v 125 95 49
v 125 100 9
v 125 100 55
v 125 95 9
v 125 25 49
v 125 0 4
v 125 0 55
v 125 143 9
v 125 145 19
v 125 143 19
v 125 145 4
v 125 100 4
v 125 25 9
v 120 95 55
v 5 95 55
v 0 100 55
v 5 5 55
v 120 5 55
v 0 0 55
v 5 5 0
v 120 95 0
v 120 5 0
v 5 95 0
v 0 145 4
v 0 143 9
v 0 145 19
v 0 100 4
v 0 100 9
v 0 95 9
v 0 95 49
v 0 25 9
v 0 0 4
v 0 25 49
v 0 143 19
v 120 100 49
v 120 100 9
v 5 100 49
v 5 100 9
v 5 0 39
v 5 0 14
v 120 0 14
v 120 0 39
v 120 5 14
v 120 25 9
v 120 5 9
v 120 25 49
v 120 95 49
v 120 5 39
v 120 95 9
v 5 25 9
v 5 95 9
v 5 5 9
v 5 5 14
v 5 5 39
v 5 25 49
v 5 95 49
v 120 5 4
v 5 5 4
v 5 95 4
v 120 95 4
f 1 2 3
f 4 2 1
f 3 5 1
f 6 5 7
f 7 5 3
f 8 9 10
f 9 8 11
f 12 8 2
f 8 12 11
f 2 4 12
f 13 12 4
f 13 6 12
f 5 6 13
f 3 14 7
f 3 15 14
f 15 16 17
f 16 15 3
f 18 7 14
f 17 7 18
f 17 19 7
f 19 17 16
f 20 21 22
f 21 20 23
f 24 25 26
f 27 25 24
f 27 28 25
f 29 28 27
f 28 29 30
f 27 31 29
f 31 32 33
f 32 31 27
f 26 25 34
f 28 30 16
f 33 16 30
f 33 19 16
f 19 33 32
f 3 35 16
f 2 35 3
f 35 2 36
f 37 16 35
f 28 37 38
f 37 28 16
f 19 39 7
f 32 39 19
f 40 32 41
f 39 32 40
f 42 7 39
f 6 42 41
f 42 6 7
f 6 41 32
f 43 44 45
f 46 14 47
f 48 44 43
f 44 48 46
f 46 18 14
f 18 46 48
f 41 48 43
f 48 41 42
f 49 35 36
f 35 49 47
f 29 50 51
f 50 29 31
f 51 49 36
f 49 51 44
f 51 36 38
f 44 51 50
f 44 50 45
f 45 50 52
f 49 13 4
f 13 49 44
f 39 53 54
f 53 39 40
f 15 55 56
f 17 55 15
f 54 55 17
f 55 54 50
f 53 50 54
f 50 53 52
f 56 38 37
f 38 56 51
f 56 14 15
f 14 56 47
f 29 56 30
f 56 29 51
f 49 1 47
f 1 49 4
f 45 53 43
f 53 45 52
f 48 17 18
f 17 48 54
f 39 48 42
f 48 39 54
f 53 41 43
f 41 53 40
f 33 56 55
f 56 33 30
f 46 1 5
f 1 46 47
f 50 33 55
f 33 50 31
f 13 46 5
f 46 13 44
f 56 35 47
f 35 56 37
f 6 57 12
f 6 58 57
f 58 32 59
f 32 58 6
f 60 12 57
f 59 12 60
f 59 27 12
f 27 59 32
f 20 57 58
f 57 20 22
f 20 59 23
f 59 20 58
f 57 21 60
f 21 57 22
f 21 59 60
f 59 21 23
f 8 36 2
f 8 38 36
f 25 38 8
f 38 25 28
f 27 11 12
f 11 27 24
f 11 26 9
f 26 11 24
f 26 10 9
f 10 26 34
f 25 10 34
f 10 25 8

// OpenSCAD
// file: hEX-hAP-Vars.scad
InnerW=115;
InnerD=90;
LipH=4;
Wall=5;
TabX=20;

DW=Wall*2;
TW=Wall*3;
OuterW=InnerW+DW;
OuterD=InnerD+DW;
Buff=1;
DB=Buff*2;
BackStopWall=2;
// main file
include <hEX-hAP-Vars.scad>;

InnerH=31;

BoxFloor=LipH+Wall;
OuterH=LipH+InnerH+DW+DW;
Front=25;
DevFeet=5;
ExtraBack=43;
BackStopWall=2;

difference()
{
  cube([OuterW,OuterD,OuterH]);
  //Main inner Cut
  translate([Wall,Wall,BoxFloor]) cube([InnerW,InnerD,OuterH+DW]); 
  //Front cut
  translate([Wall,-Buff,BoxFloor+DevFeet]) cube([InnerW,DW,Front]);
  //Side Cut
  translate([-Buff,Wall+20,BoxFloor]) cube([OuterW+DB,InnerD-20,OuterH-TW]);
  //Back Cut
  translate([Wall,Wall,BoxFloor]) cube([InnerW,OuterD,OuterH-TW]);
   //Stacking lip
  translate([-Buff,-Buff,-Buff]) cube([OuterW+DB+Buff,Wall+Buff,LipH+Buff]);
  translate([-Buff,-Buff,-Buff]) cube([Wall+Buff,OuterD+DB,LipH+Buff]);
  translate([OuterW-Wall,-Buff,-Buff]) cube([Wall+Buff,OuterD+Buff,LipH+Buff]);
  translate([-Buff,OuterD-Wall,-Buff]) cube([OuterW+DW+Buff,Wall+DB+Buff,LipH+Buff]);
  //Backext
}
translate([0,OuterD,LipH]) cube([OuterW,BackStopWall+ExtraBack,Wall]);
translate([0,OuterD+ExtraBack,BoxFloor]) cube([OuterW,BackStopWall,DW]);
